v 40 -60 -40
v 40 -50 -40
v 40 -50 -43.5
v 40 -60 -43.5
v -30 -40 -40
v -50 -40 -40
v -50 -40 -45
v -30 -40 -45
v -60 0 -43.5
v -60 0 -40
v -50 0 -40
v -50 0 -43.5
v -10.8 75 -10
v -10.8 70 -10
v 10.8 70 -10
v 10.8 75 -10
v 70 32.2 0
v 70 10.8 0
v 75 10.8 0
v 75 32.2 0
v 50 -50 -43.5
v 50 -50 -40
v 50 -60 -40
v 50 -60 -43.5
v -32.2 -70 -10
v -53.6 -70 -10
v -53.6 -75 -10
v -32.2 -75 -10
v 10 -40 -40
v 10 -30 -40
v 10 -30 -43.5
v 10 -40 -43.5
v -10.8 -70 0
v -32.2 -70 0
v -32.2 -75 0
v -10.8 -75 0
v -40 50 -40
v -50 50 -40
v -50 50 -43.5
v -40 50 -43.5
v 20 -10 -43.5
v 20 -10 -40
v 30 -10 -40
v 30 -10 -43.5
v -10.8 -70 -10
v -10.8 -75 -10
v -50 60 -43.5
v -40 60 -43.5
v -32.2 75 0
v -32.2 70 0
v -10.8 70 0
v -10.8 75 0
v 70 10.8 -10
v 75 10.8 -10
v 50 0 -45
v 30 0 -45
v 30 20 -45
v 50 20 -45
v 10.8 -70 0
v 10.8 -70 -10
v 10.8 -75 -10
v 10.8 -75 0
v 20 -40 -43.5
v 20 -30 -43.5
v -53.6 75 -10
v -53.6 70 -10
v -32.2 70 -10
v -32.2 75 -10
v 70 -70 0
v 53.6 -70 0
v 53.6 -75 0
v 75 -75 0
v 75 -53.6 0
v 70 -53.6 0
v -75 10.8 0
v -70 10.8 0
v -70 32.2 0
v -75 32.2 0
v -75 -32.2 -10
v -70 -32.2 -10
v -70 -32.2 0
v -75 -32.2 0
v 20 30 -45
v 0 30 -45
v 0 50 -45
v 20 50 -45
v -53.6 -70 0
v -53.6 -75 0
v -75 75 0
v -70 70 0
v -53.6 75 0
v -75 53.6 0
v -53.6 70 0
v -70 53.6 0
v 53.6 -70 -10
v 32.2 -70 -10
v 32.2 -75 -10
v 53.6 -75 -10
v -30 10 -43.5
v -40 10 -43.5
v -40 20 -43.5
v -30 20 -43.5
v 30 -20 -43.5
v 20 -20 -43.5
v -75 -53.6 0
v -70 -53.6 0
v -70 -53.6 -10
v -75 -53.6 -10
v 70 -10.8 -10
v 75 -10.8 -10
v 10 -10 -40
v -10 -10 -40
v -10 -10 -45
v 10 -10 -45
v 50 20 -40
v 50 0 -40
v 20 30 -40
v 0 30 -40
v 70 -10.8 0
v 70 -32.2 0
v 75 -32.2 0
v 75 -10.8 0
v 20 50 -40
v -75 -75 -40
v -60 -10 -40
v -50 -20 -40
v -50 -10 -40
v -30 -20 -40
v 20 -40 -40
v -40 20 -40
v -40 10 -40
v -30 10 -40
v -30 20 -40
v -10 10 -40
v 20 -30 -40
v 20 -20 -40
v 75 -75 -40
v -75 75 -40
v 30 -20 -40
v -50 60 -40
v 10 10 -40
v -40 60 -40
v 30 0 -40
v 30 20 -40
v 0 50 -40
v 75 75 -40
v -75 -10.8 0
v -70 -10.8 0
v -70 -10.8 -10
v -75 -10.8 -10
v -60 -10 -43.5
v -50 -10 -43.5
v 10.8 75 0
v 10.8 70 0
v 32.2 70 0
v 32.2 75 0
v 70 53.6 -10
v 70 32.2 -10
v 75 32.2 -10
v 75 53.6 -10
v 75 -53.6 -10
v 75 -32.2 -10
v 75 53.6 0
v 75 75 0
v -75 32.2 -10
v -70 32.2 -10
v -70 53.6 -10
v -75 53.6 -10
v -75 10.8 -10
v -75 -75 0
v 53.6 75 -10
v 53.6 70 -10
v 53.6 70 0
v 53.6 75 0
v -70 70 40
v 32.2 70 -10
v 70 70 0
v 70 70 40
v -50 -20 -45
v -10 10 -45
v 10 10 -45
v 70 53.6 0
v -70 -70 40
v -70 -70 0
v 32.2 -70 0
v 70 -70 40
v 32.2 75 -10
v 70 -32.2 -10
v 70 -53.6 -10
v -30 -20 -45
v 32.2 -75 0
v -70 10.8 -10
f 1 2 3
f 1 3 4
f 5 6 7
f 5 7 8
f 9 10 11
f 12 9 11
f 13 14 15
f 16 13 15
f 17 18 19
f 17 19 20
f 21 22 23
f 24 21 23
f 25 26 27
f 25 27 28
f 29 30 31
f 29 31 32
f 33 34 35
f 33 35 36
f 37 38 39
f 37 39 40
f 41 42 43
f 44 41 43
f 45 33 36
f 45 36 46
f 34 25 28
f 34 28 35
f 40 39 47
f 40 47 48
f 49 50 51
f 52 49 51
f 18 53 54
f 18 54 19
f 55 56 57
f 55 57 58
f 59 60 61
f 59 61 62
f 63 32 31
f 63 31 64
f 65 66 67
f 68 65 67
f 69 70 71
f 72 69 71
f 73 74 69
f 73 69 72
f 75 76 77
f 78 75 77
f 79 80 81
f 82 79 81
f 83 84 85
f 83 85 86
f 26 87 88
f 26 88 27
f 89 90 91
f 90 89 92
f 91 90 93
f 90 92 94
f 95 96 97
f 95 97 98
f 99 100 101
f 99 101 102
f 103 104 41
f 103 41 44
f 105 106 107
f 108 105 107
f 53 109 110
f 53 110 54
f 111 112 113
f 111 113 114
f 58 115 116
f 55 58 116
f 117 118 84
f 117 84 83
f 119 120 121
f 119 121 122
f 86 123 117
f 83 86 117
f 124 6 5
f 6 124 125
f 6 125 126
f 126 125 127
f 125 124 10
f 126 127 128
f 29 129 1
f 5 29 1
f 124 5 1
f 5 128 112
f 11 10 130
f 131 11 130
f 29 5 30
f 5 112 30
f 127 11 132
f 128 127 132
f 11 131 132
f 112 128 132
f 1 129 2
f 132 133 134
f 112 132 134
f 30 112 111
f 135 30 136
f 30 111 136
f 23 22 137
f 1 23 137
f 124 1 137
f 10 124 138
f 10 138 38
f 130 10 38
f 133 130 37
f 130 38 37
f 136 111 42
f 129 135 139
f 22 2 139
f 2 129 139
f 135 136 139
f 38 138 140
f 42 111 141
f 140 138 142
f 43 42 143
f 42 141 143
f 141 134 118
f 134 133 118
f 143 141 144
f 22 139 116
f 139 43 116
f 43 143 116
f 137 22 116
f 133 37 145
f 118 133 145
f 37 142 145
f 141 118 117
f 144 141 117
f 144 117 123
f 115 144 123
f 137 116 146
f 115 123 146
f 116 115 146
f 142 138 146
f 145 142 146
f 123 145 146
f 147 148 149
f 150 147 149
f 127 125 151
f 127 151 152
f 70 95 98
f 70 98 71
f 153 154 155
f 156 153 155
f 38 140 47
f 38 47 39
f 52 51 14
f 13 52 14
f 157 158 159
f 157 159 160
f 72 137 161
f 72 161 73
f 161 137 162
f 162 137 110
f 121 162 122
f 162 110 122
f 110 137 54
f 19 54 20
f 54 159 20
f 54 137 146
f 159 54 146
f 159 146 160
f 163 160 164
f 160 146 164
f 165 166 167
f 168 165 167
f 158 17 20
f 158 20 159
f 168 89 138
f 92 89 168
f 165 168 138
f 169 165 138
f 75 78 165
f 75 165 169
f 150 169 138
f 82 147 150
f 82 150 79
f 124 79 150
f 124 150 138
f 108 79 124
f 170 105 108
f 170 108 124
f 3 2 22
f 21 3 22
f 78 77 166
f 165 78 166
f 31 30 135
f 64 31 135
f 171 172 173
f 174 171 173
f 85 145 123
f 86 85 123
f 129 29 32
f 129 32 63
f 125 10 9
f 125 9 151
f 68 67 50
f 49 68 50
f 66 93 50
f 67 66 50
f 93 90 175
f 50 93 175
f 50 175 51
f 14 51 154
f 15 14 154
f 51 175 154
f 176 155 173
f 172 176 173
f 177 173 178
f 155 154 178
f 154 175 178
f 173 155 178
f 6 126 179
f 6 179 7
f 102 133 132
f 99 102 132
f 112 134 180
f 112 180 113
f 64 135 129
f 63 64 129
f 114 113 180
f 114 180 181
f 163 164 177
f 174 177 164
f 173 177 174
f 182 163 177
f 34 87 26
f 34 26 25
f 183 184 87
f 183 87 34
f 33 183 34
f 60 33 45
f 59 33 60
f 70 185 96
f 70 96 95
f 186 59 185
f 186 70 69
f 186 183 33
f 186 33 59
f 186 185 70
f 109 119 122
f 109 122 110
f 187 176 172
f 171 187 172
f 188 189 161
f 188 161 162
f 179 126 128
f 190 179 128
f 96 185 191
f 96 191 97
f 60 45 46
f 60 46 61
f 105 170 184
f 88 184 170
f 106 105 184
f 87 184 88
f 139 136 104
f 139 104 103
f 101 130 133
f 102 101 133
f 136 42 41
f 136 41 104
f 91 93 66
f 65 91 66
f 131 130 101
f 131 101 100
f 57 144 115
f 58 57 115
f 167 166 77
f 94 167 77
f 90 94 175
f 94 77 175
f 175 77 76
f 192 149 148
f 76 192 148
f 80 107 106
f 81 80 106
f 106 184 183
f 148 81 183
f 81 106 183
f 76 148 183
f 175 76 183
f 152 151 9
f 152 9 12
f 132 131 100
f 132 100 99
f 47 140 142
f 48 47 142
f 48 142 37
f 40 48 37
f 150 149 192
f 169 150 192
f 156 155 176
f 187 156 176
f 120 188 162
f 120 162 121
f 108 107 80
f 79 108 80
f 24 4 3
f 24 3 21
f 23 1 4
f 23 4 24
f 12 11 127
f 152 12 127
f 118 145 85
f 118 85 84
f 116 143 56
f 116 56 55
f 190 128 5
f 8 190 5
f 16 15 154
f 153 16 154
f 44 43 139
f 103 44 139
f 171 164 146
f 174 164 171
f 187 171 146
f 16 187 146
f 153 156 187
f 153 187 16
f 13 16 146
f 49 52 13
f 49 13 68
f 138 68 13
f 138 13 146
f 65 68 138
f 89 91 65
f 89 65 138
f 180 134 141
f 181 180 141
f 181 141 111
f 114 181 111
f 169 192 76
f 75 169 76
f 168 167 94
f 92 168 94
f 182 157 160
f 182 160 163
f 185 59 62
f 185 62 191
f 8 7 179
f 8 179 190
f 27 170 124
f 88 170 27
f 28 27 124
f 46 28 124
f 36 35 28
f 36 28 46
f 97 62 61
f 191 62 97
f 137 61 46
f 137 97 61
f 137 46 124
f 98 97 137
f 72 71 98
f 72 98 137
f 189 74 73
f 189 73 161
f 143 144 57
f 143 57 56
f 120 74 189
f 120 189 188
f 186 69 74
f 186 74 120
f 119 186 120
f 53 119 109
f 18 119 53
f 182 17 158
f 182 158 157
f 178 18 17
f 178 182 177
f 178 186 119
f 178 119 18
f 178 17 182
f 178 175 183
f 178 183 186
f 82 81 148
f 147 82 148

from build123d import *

# Parameters (mm, degrees)
F0_W      = 140
F0_H      = 140
F1_DEPTH  = 40
F4_DEPTH  = 145
F5_DEPTH  = 145
F6_DEPTH  = 5
F7_DEPTH  = 5
F2_W      = 5
F2_H      = 40
F8_DEPTH  = 5
F9_DEPTH  = 5
F10_W     = 10
F10_H     = 10
F11_DEPTH = 3.5
F10_W_2   = 20
F10_H_2   = 20
F12_DEPTH = 5


with BuildPart() as f1:
    # F0 (on Top) → F1 (new body, symmetric)
    with BuildSketch(Plane.XY):
        Rectangle(F0_W, F0_H)
    extrude(amount=F1_DEPTH, both=True)

    # F3 (on face) → F4 (join)
    with BuildSketch(Plane(origin=(-70, 0, 0), x_dir=(0, -1, 0), z_dir=(-1, 0, 0))):
        Polygon((-70, -40), (70, -40), (70, 0), (53.6, 0), (53.6, -10), (32.2, -10), (32.2, 0), (10.8, 0), (10.8, -10), (-10.8, -10), (-10.8, 0), (-32.2, 0), (-32.2, -10), (-53.6, -10), (-53.6, 0), (-70, 0), align=None)
    extrude(amount=-F4_DEPTH)

    # F2 (on face) → F5 (join)
    with BuildSketch(Plane(origin=(0, 70, 0), x_dir=(-1, 0, 0), z_dir=(0, 1, 0))):
        Polygon((-70, -40), (70, -40), (70, 0), (53.6, 0), (53.6, -10), (32.2, -10), (32.2, 0), (10.8, 0), (10.8, -10), (-10.8, -10), (-10.8, 0), (-32.2, 0), (-32.2, -10), (-53.6, -10), (-53.6, 0), (-70, 0), align=None)
    extrude(amount=-F5_DEPTH)

    # F2 (on face) → F6 (join)
    with BuildSketch(Plane(origin=(0, 70, 0), x_dir=(-1, 0, 0), z_dir=(0, 1, 0))):
        Polygon((-70, -40), (70, -40), (70, 0), (53.6, 0), (53.6, -10), (32.2, -10), (32.2, 0), (10.8, 0), (10.8, -10), (-10.8, -10), (-10.8, 0), (-32.2, 0), (-32.2, -10), (-53.6, -10), (-53.6, 0), (-70, 0), align=None)
    extrude(amount=F6_DEPTH)

    # F3 (on face) → F7 (join)
    with BuildSketch(Plane(origin=(-70, 0, 0), x_dir=(0, -1, 0), z_dir=(-1, 0, 0))):
        Polygon((-70, -40), (70, -40), (70, 0), (53.6, 0), (53.6, -10), (32.2, -10), (32.2, 0), (10.8, 0), (10.8, -10), (-10.8, -10), (-10.8, 0), (-32.2, 0), (-32.2, -10), (-53.6, -10), (-53.6, 0), (-70, 0), align=None)
    extrude(amount=F7_DEPTH)

    # F2 (on face) → F8 (join, through all)
    with BuildSketch(Plane(origin=(0, 70, 0), x_dir=(-1, 0, 0), z_dir=(0, 1, 0))):
        with Locations((-72.5, -20)):
            Rectangle(F2_W, F2_H)
        with Locations((72.5, -20)):
            Rectangle(F2_W, F2_H)
    extrude(amount=F8_DEPTH)

    # F9 (add, through all): faces of the model
    f9_faces = [f1.faces().sort_by_distance(p)[0] for p in [
        (72.5, -70, -20),
        (-72.5, -70, -20),
    ]]
    extrude(f9_faces, amount=F9_DEPTH)

    # F10 (on face) → F11 (join)
    with BuildSketch(Plane(origin=(0, 0, -40), x_dir=(1, 0, 0), z_dir=(0, 0, -1))):
        with Locations((-55, 5)):
            Rectangle(F10_W, F10_H)
        with Locations((-35, -15)):
            Rectangle(F10_W, F10_H)
        with Locations((-45, -55)):
            Rectangle(F10_W, F10_H)
        with Locations((25, 15)):
            Rectangle(F10_W, F10_H)
        with Locations((15, 35)):
            Rectangle(F10_W, F10_H)
        with Locations((45, 55)):
            Rectangle(F10_W, F10_H)
    extrude(amount=F11_DEPTH)

    # F10 (on face) → F12 (join)
    with BuildSketch(Plane(origin=(0, 0, -40), x_dir=(1, 0, 0), z_dir=(0, 0, -1))):
        with Locations((40, -10)):
            Rectangle(F10_W_2, F10_H_2)
        Rectangle(F10_W_2, F10_H_2)
        with Locations((-40, 30)):
            Rectangle(F10_W_2, F10_H_2)
        with Locations((10, -40)):
            Rectangle(F10_W_2, F10_H_2)
    extrude(amount=F12_DEPTH)


solid = f1.part
